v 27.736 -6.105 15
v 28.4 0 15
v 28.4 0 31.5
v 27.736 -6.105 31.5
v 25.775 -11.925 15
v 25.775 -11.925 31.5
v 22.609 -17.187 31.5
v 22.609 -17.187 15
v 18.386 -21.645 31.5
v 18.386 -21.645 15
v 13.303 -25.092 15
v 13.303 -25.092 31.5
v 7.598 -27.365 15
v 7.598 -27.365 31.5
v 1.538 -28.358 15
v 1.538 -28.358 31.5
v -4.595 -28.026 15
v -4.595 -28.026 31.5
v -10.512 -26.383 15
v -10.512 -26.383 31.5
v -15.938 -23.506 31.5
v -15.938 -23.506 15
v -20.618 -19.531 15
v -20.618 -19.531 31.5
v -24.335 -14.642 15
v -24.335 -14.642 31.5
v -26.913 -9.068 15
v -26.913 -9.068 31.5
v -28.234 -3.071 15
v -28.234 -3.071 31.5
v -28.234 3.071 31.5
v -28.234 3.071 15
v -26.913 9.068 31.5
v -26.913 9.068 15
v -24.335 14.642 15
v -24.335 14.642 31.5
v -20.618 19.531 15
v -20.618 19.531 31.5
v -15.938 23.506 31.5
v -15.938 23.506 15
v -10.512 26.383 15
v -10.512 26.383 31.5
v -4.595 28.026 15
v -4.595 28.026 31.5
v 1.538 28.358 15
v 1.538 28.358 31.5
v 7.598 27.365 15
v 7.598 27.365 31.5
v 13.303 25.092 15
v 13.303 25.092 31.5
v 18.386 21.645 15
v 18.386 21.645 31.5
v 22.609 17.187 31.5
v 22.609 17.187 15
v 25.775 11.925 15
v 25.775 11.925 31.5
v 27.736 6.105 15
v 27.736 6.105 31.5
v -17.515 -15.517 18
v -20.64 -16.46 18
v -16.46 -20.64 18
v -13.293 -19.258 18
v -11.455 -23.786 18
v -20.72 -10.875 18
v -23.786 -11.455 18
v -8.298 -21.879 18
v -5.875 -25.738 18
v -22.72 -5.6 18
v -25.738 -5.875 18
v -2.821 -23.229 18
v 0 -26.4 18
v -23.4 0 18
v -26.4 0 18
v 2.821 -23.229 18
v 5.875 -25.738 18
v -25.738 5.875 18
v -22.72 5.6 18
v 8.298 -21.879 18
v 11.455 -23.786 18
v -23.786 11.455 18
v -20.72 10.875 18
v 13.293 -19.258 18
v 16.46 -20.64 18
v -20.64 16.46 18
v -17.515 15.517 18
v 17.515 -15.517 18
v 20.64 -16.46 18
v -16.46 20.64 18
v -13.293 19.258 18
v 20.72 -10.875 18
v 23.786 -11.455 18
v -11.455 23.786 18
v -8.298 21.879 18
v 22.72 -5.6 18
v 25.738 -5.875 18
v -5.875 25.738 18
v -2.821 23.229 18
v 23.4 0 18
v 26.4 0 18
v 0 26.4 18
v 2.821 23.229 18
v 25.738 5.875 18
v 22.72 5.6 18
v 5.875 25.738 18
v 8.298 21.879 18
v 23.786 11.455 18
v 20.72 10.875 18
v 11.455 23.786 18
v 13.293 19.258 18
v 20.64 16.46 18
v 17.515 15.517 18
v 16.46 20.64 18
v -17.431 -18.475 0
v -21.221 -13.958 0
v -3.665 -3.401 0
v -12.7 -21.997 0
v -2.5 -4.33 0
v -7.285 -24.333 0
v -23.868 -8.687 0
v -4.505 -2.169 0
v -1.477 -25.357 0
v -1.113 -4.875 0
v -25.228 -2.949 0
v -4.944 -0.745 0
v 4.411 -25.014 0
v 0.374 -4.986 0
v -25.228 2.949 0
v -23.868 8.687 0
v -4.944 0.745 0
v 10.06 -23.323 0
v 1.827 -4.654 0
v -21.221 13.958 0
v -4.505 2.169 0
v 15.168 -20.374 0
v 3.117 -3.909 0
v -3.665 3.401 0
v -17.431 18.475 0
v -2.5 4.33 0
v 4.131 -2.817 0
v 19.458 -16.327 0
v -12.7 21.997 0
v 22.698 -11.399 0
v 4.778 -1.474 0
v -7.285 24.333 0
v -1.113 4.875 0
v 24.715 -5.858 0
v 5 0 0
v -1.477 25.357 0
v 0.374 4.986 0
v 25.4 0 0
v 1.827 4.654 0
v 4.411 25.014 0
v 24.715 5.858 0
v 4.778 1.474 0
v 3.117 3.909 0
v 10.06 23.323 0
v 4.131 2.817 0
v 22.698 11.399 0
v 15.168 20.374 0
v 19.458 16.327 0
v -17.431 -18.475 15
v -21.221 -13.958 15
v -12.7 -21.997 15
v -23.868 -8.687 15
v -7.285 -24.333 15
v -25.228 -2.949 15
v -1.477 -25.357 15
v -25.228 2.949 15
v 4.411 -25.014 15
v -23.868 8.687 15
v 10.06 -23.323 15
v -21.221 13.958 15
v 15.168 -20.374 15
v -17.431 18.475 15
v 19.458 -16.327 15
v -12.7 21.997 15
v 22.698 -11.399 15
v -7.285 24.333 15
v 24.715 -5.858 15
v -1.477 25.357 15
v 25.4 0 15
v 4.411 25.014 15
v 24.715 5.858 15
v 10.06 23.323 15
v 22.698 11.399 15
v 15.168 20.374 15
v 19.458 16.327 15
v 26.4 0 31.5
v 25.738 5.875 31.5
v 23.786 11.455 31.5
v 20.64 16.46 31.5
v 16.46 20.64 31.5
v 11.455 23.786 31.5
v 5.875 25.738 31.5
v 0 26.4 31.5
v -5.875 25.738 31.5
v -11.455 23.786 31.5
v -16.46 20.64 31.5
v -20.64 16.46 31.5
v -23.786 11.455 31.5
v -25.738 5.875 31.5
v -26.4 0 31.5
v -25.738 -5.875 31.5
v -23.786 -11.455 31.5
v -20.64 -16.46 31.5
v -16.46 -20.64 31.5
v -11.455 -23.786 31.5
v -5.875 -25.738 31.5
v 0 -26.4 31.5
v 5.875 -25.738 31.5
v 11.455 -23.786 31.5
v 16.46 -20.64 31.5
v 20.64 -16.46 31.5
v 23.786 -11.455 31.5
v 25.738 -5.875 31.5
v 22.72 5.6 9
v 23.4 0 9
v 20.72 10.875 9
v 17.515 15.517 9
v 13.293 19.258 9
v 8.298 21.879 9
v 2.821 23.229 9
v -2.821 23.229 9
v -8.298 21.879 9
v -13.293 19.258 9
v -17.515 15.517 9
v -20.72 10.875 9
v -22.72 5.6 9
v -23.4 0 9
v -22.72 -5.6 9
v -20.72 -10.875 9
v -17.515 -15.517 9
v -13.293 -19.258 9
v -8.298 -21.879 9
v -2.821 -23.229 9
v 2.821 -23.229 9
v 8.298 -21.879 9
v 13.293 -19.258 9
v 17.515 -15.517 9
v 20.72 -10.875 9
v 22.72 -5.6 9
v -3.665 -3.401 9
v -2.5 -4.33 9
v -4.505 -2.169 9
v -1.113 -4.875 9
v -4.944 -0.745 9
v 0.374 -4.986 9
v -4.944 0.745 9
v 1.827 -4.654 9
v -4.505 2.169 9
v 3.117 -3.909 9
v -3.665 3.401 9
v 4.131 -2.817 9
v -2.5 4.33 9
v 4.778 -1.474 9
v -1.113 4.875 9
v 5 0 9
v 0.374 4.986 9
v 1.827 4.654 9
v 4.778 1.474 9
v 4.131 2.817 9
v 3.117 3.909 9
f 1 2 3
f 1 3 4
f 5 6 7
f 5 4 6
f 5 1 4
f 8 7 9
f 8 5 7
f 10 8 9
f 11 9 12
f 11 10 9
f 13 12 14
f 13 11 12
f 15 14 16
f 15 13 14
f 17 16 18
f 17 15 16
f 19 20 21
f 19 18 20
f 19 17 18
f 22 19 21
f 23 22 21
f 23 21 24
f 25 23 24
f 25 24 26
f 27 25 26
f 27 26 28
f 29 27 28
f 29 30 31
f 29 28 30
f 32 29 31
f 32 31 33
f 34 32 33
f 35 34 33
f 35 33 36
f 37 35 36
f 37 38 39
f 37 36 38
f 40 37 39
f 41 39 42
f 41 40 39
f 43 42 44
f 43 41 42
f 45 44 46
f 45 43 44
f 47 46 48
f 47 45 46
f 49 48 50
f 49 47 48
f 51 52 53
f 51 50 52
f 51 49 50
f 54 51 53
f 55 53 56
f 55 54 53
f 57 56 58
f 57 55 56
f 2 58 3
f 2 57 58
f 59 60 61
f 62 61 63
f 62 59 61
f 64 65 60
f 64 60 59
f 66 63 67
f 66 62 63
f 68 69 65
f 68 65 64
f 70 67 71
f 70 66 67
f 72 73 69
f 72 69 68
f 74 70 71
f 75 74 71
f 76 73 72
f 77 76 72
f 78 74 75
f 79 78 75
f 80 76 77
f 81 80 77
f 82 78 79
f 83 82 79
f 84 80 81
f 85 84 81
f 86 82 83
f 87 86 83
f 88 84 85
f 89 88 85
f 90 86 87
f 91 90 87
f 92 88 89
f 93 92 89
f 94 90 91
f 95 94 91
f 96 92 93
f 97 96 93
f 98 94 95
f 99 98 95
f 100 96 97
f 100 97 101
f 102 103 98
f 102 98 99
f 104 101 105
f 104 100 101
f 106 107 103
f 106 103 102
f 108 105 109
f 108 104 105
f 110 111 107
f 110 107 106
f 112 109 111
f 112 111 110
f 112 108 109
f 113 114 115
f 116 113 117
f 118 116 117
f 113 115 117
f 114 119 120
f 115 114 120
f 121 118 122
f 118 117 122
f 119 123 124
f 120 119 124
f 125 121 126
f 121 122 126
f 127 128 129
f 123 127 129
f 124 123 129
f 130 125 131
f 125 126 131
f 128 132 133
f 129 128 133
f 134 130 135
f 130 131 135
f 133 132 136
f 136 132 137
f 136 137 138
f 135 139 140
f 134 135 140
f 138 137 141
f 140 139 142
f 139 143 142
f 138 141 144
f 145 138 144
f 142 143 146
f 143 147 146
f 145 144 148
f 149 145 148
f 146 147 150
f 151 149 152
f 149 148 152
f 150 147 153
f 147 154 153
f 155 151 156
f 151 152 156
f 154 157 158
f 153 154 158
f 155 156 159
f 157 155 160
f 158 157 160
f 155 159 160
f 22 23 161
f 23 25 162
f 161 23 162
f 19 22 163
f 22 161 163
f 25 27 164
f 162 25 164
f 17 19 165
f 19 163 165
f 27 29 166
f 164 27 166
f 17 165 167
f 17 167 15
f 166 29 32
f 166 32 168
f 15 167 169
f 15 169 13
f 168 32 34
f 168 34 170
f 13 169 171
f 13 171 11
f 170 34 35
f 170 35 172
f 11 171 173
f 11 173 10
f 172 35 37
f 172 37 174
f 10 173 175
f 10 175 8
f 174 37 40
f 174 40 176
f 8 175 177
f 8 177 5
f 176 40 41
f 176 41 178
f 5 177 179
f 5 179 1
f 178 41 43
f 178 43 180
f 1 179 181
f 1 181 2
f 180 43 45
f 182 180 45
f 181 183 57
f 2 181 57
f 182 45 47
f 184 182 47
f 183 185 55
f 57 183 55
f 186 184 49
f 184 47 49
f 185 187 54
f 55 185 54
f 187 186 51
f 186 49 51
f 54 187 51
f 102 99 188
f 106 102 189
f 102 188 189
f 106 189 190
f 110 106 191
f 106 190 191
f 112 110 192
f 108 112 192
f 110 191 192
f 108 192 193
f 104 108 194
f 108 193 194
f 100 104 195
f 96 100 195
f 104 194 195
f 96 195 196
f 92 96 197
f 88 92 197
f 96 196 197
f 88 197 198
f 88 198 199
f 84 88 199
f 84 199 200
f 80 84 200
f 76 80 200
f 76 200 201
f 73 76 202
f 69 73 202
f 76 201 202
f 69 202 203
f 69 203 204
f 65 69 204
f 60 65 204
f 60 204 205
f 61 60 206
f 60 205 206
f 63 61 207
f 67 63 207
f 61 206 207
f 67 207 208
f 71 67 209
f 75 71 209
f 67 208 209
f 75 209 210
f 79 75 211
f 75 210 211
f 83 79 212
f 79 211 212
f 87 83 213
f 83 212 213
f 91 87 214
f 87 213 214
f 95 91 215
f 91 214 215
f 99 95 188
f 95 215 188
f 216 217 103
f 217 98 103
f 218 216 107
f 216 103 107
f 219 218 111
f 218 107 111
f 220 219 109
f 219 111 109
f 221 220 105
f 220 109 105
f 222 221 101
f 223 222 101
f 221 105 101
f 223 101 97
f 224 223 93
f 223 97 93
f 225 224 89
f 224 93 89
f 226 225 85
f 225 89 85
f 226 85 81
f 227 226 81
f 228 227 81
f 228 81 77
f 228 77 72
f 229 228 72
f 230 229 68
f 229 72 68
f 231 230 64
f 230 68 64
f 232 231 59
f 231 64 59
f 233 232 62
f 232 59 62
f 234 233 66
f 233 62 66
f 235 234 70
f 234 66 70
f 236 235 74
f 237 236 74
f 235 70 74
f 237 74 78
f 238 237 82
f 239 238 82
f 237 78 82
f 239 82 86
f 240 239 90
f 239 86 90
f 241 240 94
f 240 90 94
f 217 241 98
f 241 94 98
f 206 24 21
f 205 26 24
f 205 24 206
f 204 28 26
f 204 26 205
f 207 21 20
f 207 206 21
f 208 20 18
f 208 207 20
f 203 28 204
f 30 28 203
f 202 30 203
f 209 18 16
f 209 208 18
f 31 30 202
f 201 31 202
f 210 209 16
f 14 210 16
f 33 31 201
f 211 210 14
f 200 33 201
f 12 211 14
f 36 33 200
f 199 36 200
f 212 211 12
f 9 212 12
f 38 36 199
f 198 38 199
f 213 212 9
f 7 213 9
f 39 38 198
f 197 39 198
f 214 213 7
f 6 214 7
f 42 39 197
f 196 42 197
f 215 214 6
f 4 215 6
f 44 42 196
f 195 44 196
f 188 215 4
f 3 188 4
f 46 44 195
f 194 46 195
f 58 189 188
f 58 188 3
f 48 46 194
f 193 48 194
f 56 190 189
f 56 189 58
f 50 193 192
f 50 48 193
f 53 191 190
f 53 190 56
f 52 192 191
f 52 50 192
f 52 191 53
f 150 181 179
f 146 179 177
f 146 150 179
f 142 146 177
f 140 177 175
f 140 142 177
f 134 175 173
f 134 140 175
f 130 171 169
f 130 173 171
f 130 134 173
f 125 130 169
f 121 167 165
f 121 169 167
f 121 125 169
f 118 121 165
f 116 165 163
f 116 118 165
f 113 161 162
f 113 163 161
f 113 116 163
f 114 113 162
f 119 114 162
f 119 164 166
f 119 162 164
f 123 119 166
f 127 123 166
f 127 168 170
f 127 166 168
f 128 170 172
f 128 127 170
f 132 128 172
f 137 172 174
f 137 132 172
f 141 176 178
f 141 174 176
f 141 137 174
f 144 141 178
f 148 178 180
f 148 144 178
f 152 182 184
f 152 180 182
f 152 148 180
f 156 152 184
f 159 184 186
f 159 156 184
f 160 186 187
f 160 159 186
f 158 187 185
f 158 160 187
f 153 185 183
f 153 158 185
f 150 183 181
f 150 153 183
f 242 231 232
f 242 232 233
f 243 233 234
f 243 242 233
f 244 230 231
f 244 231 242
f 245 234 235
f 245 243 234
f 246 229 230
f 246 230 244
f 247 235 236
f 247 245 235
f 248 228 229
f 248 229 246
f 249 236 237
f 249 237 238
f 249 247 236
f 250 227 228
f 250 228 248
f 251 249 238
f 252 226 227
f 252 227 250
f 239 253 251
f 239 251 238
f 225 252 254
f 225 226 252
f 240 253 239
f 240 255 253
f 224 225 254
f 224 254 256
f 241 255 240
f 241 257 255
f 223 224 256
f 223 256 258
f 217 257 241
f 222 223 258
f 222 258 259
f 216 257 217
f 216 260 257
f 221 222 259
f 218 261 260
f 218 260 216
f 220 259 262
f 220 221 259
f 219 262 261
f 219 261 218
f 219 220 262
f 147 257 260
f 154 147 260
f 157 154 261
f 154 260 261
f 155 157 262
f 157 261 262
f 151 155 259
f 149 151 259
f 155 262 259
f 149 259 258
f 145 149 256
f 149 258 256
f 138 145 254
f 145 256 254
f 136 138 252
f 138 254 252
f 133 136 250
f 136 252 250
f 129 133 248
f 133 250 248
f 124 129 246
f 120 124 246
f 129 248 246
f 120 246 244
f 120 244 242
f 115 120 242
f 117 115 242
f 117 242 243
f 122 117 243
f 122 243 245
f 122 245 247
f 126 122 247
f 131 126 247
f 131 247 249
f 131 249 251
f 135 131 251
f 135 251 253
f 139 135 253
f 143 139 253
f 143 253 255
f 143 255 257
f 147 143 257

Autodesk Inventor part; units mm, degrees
ref_plane "YZ Plane" through (0, 0, 0) normal (1, 0, 0) x (0, 1, 0)
ref_plane "XZ Plane" through (0, 0, 0) normal (0, 1, 0) x (-1, 0, 0)
ref_plane "XY Plane" through (0, 0, 0) normal (0, 0, 1) x (1, 0, 0)
sketch "Sketch1" plane through (0, 0, 0) normal (0, 0, 1) x (1, 0, 0)
  circle A0 centre (0, 0) radius 25.4
  dimension "d0" = 50.8
extrude "Extrusion1" add sketch "Sketch1" along normal blind 15
sketch "Sketch2" plane through (0, 0, 15) normal (0, 0, 1) x (1, 0, 0)
  circle A0 centre (0, 0) radius 25.4 projected
  circle A1 centre (0, 0) radius 28.4
  dimension "d3" = 56.8
extrude "Extrusion2" add sketch "Sketch2" along normal blind 16.5 contours A0 | A1
sketch "Sketch3" plane through (0, 0, 31.5) normal (0, 0, 1) x (1, 0, 0)
  circle A0 centre (0, 0) radius 28.4 projected
  circle A1 centre (0, 0) radius 26.4
  dimension "d6" = 52.8
extrude "Extrusion3" cut sketch "Sketch3" against normal blind 13.5 contours A1
sketch "Sketch4" plane through (0, 0, 18) normal (0, 0, 1) x (1, 0, 0)
  circle A0 centre (0, 0) radius 26.4 projected
  circle A1 centre (0, 0) radius 23.4
  dimension "d9" = 46.8
extrude "Extrusion4" cut sketch "Sketch4" against normal blind 9 contours A1
sketch "Sketch5" plane through (0, 0, 9) normal (0, 0, 1) x (1, 0, 0)
  circle A0 centre (0, 0) radius 23.4 projected
  circle A1 centre (0, 0) radius 5
  dimension "d12" = 10
extrude "Extrusion5" cut sketch "Sketch5" against normal through all contours A1
properties part number "PZTmount"
